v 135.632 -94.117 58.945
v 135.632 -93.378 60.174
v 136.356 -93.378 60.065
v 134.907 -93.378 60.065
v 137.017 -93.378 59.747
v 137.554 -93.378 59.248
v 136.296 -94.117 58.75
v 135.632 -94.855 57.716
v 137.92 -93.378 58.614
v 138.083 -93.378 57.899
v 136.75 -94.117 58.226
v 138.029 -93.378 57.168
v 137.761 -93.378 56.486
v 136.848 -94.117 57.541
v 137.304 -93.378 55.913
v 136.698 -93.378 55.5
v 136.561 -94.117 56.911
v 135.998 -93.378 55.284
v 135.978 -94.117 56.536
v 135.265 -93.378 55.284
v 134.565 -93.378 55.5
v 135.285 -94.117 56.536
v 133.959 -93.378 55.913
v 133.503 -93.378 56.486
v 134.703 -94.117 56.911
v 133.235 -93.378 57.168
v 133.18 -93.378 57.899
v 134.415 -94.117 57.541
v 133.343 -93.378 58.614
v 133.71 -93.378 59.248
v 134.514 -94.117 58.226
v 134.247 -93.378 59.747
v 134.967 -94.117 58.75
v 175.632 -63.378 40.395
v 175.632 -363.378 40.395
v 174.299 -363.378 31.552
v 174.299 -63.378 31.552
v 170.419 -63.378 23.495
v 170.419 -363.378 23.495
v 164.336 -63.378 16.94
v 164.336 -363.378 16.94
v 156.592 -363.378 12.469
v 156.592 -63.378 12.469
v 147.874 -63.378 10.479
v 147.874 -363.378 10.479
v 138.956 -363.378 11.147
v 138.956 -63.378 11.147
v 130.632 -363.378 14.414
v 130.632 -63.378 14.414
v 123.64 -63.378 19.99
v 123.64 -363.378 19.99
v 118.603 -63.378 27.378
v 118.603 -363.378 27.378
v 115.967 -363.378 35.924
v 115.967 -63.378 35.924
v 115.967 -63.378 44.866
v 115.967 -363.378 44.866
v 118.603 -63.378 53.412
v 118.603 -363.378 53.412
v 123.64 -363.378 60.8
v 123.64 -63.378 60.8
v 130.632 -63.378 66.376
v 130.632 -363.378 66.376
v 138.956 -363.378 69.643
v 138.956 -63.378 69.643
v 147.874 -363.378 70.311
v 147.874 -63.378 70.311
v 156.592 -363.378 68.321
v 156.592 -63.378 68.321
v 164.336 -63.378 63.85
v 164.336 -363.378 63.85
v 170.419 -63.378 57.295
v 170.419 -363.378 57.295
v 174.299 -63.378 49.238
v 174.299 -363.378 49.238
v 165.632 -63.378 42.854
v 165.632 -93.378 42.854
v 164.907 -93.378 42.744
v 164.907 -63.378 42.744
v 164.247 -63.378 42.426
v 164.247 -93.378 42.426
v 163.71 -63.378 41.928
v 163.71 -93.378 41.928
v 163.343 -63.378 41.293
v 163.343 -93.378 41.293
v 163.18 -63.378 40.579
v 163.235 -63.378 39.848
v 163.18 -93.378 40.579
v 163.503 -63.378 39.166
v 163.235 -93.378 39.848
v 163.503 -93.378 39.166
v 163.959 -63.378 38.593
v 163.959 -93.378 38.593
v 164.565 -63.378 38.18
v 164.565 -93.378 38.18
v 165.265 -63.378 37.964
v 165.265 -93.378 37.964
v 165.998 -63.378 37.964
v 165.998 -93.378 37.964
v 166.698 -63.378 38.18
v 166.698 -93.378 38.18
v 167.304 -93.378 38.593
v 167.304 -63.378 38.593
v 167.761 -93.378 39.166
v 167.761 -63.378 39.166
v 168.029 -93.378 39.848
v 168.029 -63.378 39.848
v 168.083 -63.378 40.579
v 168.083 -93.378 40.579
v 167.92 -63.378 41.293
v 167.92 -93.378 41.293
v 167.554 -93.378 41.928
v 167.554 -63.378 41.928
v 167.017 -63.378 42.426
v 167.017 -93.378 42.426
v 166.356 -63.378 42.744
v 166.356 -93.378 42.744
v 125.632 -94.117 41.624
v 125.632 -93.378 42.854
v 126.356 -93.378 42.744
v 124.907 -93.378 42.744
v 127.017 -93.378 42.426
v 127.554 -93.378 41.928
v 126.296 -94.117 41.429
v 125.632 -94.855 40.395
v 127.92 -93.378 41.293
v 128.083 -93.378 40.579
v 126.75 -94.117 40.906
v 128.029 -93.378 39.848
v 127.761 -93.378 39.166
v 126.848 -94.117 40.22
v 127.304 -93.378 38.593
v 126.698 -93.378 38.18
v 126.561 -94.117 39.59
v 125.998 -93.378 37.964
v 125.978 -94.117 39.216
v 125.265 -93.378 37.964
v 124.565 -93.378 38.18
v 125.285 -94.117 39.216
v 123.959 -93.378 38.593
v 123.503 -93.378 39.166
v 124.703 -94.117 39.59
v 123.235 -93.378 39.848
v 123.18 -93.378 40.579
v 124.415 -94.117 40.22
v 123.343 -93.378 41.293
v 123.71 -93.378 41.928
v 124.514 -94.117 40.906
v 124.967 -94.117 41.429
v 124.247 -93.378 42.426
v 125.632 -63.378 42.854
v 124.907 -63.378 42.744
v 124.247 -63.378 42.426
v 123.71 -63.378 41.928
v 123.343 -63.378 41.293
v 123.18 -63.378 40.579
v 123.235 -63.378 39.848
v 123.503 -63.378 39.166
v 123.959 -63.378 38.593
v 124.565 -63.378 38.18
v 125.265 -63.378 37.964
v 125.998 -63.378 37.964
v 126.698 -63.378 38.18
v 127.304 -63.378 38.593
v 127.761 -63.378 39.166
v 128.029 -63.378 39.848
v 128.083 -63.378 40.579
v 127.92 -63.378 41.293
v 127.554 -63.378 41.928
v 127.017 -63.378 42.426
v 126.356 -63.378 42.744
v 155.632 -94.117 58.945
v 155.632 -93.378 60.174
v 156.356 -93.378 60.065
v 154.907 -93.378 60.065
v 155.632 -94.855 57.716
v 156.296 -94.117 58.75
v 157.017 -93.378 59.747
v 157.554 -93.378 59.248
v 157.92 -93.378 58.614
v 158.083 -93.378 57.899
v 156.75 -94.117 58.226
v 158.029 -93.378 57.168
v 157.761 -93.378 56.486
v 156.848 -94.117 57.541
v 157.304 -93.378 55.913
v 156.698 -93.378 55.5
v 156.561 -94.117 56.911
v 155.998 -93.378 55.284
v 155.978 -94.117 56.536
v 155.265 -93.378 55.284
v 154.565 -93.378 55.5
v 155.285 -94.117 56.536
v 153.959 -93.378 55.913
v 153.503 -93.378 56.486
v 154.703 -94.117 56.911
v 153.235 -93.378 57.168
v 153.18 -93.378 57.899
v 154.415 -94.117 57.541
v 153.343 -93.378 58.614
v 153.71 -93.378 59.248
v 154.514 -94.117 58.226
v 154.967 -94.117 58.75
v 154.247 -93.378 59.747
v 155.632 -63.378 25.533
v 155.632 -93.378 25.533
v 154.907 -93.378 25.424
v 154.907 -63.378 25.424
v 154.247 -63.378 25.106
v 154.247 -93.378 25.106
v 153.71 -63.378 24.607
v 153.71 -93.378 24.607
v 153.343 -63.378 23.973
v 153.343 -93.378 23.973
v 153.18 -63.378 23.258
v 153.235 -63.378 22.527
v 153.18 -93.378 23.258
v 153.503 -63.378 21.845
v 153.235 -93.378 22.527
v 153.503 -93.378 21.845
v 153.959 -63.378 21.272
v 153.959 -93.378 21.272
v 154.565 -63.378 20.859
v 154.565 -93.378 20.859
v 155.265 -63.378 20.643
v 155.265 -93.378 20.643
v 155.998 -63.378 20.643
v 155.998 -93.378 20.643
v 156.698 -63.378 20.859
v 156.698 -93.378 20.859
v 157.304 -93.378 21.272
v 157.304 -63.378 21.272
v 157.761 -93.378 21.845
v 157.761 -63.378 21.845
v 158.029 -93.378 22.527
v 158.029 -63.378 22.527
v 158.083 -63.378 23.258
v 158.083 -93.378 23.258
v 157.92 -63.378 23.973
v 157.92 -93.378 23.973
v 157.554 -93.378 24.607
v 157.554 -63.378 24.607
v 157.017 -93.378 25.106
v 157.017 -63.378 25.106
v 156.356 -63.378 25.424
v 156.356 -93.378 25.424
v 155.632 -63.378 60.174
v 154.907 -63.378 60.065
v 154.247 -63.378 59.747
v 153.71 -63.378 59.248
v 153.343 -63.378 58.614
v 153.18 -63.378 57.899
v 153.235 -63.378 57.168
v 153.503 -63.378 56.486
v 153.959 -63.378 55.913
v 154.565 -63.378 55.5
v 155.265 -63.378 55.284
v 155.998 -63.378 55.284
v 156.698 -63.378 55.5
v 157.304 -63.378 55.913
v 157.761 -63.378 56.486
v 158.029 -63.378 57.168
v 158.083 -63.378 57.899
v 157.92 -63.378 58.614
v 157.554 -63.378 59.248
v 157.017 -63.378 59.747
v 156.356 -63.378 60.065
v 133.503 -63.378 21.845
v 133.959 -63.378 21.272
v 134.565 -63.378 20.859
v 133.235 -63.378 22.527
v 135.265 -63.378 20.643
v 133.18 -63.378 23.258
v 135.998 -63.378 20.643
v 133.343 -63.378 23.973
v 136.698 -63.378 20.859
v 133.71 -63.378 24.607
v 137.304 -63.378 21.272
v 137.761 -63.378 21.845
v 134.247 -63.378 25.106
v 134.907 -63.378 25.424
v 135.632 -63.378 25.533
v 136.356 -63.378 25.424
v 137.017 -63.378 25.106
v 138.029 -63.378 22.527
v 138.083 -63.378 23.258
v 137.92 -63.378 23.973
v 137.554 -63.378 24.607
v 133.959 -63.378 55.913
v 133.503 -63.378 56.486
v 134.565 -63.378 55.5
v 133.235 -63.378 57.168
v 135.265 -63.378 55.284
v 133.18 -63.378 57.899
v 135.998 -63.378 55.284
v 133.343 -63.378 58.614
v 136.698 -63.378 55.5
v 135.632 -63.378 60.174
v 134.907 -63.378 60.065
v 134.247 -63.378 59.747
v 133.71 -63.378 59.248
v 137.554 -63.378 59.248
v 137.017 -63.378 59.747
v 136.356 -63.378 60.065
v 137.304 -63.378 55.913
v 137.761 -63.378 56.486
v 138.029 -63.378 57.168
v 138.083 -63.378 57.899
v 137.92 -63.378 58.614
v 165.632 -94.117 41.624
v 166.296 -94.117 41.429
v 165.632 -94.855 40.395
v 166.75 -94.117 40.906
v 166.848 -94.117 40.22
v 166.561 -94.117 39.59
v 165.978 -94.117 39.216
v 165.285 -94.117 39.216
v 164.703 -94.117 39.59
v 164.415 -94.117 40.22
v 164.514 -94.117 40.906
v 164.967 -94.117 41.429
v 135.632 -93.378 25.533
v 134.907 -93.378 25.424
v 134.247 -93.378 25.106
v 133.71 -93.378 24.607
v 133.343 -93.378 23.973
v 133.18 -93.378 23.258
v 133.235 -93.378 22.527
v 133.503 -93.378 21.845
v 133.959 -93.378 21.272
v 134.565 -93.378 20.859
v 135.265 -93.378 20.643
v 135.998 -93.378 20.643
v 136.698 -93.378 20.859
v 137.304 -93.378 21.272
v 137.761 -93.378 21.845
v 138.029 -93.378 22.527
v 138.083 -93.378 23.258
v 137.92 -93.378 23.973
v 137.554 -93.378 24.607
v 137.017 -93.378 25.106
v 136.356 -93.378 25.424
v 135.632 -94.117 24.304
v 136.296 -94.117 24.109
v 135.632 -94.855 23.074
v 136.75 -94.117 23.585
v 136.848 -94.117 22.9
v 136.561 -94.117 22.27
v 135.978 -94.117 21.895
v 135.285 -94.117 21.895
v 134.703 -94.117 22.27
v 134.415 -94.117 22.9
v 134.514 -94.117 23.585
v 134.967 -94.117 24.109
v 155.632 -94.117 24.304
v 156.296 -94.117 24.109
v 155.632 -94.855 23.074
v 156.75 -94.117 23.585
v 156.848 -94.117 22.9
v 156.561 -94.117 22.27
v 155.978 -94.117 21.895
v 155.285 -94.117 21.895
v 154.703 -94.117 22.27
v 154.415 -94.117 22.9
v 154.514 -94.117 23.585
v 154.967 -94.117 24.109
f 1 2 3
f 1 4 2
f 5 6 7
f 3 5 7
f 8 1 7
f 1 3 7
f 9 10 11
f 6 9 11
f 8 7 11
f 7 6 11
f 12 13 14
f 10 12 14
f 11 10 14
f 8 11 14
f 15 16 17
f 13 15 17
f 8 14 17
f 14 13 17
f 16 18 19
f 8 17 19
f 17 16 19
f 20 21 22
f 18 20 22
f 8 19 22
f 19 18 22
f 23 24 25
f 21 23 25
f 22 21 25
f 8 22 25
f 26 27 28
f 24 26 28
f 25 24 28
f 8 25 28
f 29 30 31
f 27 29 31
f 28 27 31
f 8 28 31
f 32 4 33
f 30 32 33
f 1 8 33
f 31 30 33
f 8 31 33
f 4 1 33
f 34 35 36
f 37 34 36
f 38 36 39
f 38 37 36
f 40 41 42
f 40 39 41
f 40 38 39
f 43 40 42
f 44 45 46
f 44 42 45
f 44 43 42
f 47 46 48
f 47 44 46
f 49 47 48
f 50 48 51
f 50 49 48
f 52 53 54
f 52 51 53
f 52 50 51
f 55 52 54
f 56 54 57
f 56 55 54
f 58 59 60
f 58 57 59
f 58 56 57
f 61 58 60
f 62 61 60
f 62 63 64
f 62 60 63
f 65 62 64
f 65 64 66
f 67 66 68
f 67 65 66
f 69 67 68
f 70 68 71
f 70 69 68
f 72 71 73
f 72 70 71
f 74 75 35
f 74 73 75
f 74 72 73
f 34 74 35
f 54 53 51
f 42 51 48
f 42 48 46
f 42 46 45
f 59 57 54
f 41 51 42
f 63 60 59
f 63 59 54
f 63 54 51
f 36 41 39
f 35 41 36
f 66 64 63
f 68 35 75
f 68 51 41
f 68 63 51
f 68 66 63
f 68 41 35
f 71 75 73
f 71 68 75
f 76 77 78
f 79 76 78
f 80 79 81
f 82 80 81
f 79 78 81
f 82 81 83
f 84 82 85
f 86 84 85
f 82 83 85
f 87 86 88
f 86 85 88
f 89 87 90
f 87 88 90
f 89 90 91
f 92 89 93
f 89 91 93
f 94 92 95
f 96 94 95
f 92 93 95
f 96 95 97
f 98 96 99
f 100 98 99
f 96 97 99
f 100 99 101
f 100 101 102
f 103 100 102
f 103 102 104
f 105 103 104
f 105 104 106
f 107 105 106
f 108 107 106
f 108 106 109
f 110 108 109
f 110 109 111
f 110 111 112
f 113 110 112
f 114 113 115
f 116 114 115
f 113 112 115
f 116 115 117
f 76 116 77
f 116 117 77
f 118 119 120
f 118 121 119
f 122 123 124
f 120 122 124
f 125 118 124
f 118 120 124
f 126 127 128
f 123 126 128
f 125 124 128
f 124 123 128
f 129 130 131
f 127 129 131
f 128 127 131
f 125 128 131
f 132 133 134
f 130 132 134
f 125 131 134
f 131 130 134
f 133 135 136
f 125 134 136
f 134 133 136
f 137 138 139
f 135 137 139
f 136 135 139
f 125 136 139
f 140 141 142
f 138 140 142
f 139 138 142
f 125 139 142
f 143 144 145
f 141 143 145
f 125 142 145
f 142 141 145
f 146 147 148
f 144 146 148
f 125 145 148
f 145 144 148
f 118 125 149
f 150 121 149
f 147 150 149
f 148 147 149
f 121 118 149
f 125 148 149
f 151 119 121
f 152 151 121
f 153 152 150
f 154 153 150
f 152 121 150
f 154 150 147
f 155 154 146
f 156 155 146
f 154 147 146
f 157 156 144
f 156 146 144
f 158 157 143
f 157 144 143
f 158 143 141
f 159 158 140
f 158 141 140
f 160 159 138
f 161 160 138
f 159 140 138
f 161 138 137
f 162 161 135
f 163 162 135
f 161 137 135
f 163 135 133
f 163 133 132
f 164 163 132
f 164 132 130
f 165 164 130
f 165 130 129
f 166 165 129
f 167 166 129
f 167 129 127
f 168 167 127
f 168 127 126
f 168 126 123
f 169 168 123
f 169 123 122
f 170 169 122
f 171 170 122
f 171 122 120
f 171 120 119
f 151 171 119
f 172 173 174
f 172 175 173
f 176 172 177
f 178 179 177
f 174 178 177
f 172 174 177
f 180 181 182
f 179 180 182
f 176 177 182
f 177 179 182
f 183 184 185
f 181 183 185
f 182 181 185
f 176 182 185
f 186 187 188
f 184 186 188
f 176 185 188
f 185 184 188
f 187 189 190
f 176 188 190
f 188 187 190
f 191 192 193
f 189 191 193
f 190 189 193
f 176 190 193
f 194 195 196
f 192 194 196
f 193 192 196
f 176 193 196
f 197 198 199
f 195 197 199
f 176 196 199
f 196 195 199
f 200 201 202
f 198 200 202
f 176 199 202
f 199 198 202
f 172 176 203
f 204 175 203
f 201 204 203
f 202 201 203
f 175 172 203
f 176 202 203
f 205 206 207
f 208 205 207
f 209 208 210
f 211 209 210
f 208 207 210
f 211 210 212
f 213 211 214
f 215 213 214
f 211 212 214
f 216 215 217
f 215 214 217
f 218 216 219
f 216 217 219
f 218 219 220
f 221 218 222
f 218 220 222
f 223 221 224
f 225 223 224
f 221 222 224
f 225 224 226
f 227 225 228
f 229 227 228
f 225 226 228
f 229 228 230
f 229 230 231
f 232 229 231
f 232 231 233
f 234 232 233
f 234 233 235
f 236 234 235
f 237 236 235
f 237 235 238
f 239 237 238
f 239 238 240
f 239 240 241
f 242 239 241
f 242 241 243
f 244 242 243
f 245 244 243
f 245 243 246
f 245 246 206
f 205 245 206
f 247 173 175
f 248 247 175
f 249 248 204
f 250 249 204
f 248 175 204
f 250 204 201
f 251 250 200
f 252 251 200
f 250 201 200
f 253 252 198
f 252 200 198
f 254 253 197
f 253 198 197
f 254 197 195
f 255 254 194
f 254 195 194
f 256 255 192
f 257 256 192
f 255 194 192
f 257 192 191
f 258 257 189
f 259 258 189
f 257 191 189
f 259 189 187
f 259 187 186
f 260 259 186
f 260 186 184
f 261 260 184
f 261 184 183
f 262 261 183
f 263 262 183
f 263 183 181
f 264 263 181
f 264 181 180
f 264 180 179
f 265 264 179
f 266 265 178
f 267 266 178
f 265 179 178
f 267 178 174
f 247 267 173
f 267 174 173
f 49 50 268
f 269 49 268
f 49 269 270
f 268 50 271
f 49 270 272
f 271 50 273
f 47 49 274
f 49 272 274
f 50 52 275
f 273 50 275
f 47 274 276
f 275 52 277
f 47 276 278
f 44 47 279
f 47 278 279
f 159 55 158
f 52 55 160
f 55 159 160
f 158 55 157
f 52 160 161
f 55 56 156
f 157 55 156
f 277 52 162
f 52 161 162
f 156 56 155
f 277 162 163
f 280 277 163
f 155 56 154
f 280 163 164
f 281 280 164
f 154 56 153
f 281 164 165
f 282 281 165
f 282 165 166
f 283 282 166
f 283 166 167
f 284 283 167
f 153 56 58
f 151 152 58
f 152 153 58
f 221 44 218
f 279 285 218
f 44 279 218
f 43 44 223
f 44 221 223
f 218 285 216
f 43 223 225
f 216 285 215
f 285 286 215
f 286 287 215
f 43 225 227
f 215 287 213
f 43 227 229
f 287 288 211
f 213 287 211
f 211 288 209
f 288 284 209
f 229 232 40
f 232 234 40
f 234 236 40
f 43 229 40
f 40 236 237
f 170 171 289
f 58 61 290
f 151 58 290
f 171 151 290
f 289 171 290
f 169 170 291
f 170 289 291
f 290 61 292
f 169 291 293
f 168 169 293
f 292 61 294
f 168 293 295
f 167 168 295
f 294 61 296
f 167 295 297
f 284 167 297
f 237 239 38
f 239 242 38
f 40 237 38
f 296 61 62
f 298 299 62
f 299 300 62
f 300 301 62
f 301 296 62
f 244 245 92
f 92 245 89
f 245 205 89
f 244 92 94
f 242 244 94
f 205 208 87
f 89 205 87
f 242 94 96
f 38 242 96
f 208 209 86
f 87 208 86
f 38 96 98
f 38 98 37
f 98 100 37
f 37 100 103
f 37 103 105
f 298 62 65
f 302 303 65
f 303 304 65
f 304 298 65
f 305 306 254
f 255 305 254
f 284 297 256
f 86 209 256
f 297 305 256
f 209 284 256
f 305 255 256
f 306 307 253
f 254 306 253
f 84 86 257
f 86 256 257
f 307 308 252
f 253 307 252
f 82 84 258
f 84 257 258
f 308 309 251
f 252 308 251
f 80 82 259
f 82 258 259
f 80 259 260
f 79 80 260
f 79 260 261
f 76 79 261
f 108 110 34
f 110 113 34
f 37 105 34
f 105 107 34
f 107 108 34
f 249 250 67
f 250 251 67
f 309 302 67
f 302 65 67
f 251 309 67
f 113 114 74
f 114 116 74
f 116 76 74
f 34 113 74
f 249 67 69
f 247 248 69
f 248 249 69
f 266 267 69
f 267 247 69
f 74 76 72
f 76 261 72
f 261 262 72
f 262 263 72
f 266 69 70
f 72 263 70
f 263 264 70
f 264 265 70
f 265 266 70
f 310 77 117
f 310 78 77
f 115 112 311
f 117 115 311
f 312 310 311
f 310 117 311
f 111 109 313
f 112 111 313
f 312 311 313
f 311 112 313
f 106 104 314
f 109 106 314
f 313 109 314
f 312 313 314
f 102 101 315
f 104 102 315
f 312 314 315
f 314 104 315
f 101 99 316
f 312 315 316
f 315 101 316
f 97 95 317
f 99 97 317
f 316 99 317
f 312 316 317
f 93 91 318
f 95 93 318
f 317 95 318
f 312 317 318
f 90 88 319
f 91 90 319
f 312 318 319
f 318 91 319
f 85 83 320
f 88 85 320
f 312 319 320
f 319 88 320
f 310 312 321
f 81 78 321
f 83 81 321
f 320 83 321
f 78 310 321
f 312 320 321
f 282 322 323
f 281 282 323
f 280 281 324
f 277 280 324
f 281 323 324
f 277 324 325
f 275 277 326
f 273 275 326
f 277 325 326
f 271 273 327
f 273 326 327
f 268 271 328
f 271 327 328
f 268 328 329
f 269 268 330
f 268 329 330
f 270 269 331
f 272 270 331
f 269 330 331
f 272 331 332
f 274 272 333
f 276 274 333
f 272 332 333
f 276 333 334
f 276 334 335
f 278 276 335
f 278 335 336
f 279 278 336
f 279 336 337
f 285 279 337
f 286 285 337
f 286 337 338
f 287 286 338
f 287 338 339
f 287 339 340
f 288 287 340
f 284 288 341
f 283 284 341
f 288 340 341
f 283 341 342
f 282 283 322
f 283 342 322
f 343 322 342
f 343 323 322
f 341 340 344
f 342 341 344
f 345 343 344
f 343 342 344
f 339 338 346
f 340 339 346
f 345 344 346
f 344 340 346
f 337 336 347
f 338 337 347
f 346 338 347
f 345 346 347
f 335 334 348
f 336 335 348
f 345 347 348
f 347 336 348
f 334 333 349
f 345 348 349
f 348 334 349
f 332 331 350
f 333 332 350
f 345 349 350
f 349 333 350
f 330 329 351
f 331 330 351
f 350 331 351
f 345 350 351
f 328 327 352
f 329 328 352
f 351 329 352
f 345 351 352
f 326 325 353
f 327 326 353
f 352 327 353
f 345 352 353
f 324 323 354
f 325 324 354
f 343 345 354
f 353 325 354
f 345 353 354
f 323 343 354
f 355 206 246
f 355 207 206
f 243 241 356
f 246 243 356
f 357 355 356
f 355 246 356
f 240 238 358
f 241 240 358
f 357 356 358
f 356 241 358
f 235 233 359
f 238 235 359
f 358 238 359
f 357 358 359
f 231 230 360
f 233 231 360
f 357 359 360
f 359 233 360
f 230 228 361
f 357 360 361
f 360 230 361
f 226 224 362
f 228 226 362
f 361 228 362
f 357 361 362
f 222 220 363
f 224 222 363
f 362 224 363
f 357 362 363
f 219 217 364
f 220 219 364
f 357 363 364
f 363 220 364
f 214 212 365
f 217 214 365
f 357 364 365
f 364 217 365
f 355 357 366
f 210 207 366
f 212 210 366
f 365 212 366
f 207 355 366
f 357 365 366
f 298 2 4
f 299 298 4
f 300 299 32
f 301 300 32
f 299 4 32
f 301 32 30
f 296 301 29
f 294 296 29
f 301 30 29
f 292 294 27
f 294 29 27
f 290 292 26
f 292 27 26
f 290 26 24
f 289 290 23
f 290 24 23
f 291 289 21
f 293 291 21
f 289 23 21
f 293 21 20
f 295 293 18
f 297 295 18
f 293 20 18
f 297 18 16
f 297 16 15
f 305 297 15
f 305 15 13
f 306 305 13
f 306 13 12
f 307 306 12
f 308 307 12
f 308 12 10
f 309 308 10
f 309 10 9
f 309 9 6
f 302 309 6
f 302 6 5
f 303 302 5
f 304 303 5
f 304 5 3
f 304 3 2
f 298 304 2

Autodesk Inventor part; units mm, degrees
ref_plane "YZ Plane" through (0, 0, 0) normal (1, 0, 0) x (0, 1, 0)
ref_plane "XZ Plane" through (0, 0, 0) normal (0, 1, 0) x (-1, 0, 0)
ref_plane "XY Plane" through (0, 0, 0) normal (0, 0, 1) x (1, 0, 0)
ref_plane "Work Plane1" through (145.6317, -63.3782, 40.395) normal (0, -1, 0) x (1, 0, 0)
sketch "Sketch1" plane through (145.6317, -63.3782, 40.395) normal (0, -1, 0) x (1, 0, 0)
  circle A0 centre (0, 0) radius 60 projected
  circle A1 centre (0, 0) radius 30
  point P0 (-145.6317, -40.395)
  dimension "d0" = 60
extrude "Extrusion1" add sketch "Sketch1" along normal blind 300 contours A1
sketch "Sketch2" plane through (145.6317, -63.3782, 40.395) normal (0, 1, 0) x (1, 0, 0)
  circle A0 centre (-20, 0) radius 3.3 projected
  circle A1 centre (-10, 17.3205) radius 3.3 projected
  circle A2 centre (10, 17.3205) radius 5.5 projected
  circle A3 centre (10, 17.3205) radius 3.3 projected
  circle A4 centre (20, 0) radius 3.3 projected
  circle A5 centre (10, -17.3205) radius 3.3 projected
  circle A6 centre (-10, -17.3205) radius 3.3 projected
  point P0 (-145.6317, 40.395)
hole "Hole1" at (135.6317, -63.3782, 23.0745) at (155.6317, -63.3782, 23.0745) at (165.6317, -63.3782, 40.395) at (155.6317, -63.3782, 57.7155) at (135.6317, -63.3782, 57.7155) at (125.6317, -63.3782, 40.395) direction (0, -1, 0) diameter 4.917 depth 30 tip angle 118 thread size "M6x1" class "6H" standard "ISO Metric profile"
sketch "Sketch3" plane through (145.6317, -63.3782, 40.395) normal (0, 1, 0) x (1, 0, 0)
  point P0 (-145.6317, 40.395)
  point P1 (0, 0)
properties part number "base_stange" material "Copper"
